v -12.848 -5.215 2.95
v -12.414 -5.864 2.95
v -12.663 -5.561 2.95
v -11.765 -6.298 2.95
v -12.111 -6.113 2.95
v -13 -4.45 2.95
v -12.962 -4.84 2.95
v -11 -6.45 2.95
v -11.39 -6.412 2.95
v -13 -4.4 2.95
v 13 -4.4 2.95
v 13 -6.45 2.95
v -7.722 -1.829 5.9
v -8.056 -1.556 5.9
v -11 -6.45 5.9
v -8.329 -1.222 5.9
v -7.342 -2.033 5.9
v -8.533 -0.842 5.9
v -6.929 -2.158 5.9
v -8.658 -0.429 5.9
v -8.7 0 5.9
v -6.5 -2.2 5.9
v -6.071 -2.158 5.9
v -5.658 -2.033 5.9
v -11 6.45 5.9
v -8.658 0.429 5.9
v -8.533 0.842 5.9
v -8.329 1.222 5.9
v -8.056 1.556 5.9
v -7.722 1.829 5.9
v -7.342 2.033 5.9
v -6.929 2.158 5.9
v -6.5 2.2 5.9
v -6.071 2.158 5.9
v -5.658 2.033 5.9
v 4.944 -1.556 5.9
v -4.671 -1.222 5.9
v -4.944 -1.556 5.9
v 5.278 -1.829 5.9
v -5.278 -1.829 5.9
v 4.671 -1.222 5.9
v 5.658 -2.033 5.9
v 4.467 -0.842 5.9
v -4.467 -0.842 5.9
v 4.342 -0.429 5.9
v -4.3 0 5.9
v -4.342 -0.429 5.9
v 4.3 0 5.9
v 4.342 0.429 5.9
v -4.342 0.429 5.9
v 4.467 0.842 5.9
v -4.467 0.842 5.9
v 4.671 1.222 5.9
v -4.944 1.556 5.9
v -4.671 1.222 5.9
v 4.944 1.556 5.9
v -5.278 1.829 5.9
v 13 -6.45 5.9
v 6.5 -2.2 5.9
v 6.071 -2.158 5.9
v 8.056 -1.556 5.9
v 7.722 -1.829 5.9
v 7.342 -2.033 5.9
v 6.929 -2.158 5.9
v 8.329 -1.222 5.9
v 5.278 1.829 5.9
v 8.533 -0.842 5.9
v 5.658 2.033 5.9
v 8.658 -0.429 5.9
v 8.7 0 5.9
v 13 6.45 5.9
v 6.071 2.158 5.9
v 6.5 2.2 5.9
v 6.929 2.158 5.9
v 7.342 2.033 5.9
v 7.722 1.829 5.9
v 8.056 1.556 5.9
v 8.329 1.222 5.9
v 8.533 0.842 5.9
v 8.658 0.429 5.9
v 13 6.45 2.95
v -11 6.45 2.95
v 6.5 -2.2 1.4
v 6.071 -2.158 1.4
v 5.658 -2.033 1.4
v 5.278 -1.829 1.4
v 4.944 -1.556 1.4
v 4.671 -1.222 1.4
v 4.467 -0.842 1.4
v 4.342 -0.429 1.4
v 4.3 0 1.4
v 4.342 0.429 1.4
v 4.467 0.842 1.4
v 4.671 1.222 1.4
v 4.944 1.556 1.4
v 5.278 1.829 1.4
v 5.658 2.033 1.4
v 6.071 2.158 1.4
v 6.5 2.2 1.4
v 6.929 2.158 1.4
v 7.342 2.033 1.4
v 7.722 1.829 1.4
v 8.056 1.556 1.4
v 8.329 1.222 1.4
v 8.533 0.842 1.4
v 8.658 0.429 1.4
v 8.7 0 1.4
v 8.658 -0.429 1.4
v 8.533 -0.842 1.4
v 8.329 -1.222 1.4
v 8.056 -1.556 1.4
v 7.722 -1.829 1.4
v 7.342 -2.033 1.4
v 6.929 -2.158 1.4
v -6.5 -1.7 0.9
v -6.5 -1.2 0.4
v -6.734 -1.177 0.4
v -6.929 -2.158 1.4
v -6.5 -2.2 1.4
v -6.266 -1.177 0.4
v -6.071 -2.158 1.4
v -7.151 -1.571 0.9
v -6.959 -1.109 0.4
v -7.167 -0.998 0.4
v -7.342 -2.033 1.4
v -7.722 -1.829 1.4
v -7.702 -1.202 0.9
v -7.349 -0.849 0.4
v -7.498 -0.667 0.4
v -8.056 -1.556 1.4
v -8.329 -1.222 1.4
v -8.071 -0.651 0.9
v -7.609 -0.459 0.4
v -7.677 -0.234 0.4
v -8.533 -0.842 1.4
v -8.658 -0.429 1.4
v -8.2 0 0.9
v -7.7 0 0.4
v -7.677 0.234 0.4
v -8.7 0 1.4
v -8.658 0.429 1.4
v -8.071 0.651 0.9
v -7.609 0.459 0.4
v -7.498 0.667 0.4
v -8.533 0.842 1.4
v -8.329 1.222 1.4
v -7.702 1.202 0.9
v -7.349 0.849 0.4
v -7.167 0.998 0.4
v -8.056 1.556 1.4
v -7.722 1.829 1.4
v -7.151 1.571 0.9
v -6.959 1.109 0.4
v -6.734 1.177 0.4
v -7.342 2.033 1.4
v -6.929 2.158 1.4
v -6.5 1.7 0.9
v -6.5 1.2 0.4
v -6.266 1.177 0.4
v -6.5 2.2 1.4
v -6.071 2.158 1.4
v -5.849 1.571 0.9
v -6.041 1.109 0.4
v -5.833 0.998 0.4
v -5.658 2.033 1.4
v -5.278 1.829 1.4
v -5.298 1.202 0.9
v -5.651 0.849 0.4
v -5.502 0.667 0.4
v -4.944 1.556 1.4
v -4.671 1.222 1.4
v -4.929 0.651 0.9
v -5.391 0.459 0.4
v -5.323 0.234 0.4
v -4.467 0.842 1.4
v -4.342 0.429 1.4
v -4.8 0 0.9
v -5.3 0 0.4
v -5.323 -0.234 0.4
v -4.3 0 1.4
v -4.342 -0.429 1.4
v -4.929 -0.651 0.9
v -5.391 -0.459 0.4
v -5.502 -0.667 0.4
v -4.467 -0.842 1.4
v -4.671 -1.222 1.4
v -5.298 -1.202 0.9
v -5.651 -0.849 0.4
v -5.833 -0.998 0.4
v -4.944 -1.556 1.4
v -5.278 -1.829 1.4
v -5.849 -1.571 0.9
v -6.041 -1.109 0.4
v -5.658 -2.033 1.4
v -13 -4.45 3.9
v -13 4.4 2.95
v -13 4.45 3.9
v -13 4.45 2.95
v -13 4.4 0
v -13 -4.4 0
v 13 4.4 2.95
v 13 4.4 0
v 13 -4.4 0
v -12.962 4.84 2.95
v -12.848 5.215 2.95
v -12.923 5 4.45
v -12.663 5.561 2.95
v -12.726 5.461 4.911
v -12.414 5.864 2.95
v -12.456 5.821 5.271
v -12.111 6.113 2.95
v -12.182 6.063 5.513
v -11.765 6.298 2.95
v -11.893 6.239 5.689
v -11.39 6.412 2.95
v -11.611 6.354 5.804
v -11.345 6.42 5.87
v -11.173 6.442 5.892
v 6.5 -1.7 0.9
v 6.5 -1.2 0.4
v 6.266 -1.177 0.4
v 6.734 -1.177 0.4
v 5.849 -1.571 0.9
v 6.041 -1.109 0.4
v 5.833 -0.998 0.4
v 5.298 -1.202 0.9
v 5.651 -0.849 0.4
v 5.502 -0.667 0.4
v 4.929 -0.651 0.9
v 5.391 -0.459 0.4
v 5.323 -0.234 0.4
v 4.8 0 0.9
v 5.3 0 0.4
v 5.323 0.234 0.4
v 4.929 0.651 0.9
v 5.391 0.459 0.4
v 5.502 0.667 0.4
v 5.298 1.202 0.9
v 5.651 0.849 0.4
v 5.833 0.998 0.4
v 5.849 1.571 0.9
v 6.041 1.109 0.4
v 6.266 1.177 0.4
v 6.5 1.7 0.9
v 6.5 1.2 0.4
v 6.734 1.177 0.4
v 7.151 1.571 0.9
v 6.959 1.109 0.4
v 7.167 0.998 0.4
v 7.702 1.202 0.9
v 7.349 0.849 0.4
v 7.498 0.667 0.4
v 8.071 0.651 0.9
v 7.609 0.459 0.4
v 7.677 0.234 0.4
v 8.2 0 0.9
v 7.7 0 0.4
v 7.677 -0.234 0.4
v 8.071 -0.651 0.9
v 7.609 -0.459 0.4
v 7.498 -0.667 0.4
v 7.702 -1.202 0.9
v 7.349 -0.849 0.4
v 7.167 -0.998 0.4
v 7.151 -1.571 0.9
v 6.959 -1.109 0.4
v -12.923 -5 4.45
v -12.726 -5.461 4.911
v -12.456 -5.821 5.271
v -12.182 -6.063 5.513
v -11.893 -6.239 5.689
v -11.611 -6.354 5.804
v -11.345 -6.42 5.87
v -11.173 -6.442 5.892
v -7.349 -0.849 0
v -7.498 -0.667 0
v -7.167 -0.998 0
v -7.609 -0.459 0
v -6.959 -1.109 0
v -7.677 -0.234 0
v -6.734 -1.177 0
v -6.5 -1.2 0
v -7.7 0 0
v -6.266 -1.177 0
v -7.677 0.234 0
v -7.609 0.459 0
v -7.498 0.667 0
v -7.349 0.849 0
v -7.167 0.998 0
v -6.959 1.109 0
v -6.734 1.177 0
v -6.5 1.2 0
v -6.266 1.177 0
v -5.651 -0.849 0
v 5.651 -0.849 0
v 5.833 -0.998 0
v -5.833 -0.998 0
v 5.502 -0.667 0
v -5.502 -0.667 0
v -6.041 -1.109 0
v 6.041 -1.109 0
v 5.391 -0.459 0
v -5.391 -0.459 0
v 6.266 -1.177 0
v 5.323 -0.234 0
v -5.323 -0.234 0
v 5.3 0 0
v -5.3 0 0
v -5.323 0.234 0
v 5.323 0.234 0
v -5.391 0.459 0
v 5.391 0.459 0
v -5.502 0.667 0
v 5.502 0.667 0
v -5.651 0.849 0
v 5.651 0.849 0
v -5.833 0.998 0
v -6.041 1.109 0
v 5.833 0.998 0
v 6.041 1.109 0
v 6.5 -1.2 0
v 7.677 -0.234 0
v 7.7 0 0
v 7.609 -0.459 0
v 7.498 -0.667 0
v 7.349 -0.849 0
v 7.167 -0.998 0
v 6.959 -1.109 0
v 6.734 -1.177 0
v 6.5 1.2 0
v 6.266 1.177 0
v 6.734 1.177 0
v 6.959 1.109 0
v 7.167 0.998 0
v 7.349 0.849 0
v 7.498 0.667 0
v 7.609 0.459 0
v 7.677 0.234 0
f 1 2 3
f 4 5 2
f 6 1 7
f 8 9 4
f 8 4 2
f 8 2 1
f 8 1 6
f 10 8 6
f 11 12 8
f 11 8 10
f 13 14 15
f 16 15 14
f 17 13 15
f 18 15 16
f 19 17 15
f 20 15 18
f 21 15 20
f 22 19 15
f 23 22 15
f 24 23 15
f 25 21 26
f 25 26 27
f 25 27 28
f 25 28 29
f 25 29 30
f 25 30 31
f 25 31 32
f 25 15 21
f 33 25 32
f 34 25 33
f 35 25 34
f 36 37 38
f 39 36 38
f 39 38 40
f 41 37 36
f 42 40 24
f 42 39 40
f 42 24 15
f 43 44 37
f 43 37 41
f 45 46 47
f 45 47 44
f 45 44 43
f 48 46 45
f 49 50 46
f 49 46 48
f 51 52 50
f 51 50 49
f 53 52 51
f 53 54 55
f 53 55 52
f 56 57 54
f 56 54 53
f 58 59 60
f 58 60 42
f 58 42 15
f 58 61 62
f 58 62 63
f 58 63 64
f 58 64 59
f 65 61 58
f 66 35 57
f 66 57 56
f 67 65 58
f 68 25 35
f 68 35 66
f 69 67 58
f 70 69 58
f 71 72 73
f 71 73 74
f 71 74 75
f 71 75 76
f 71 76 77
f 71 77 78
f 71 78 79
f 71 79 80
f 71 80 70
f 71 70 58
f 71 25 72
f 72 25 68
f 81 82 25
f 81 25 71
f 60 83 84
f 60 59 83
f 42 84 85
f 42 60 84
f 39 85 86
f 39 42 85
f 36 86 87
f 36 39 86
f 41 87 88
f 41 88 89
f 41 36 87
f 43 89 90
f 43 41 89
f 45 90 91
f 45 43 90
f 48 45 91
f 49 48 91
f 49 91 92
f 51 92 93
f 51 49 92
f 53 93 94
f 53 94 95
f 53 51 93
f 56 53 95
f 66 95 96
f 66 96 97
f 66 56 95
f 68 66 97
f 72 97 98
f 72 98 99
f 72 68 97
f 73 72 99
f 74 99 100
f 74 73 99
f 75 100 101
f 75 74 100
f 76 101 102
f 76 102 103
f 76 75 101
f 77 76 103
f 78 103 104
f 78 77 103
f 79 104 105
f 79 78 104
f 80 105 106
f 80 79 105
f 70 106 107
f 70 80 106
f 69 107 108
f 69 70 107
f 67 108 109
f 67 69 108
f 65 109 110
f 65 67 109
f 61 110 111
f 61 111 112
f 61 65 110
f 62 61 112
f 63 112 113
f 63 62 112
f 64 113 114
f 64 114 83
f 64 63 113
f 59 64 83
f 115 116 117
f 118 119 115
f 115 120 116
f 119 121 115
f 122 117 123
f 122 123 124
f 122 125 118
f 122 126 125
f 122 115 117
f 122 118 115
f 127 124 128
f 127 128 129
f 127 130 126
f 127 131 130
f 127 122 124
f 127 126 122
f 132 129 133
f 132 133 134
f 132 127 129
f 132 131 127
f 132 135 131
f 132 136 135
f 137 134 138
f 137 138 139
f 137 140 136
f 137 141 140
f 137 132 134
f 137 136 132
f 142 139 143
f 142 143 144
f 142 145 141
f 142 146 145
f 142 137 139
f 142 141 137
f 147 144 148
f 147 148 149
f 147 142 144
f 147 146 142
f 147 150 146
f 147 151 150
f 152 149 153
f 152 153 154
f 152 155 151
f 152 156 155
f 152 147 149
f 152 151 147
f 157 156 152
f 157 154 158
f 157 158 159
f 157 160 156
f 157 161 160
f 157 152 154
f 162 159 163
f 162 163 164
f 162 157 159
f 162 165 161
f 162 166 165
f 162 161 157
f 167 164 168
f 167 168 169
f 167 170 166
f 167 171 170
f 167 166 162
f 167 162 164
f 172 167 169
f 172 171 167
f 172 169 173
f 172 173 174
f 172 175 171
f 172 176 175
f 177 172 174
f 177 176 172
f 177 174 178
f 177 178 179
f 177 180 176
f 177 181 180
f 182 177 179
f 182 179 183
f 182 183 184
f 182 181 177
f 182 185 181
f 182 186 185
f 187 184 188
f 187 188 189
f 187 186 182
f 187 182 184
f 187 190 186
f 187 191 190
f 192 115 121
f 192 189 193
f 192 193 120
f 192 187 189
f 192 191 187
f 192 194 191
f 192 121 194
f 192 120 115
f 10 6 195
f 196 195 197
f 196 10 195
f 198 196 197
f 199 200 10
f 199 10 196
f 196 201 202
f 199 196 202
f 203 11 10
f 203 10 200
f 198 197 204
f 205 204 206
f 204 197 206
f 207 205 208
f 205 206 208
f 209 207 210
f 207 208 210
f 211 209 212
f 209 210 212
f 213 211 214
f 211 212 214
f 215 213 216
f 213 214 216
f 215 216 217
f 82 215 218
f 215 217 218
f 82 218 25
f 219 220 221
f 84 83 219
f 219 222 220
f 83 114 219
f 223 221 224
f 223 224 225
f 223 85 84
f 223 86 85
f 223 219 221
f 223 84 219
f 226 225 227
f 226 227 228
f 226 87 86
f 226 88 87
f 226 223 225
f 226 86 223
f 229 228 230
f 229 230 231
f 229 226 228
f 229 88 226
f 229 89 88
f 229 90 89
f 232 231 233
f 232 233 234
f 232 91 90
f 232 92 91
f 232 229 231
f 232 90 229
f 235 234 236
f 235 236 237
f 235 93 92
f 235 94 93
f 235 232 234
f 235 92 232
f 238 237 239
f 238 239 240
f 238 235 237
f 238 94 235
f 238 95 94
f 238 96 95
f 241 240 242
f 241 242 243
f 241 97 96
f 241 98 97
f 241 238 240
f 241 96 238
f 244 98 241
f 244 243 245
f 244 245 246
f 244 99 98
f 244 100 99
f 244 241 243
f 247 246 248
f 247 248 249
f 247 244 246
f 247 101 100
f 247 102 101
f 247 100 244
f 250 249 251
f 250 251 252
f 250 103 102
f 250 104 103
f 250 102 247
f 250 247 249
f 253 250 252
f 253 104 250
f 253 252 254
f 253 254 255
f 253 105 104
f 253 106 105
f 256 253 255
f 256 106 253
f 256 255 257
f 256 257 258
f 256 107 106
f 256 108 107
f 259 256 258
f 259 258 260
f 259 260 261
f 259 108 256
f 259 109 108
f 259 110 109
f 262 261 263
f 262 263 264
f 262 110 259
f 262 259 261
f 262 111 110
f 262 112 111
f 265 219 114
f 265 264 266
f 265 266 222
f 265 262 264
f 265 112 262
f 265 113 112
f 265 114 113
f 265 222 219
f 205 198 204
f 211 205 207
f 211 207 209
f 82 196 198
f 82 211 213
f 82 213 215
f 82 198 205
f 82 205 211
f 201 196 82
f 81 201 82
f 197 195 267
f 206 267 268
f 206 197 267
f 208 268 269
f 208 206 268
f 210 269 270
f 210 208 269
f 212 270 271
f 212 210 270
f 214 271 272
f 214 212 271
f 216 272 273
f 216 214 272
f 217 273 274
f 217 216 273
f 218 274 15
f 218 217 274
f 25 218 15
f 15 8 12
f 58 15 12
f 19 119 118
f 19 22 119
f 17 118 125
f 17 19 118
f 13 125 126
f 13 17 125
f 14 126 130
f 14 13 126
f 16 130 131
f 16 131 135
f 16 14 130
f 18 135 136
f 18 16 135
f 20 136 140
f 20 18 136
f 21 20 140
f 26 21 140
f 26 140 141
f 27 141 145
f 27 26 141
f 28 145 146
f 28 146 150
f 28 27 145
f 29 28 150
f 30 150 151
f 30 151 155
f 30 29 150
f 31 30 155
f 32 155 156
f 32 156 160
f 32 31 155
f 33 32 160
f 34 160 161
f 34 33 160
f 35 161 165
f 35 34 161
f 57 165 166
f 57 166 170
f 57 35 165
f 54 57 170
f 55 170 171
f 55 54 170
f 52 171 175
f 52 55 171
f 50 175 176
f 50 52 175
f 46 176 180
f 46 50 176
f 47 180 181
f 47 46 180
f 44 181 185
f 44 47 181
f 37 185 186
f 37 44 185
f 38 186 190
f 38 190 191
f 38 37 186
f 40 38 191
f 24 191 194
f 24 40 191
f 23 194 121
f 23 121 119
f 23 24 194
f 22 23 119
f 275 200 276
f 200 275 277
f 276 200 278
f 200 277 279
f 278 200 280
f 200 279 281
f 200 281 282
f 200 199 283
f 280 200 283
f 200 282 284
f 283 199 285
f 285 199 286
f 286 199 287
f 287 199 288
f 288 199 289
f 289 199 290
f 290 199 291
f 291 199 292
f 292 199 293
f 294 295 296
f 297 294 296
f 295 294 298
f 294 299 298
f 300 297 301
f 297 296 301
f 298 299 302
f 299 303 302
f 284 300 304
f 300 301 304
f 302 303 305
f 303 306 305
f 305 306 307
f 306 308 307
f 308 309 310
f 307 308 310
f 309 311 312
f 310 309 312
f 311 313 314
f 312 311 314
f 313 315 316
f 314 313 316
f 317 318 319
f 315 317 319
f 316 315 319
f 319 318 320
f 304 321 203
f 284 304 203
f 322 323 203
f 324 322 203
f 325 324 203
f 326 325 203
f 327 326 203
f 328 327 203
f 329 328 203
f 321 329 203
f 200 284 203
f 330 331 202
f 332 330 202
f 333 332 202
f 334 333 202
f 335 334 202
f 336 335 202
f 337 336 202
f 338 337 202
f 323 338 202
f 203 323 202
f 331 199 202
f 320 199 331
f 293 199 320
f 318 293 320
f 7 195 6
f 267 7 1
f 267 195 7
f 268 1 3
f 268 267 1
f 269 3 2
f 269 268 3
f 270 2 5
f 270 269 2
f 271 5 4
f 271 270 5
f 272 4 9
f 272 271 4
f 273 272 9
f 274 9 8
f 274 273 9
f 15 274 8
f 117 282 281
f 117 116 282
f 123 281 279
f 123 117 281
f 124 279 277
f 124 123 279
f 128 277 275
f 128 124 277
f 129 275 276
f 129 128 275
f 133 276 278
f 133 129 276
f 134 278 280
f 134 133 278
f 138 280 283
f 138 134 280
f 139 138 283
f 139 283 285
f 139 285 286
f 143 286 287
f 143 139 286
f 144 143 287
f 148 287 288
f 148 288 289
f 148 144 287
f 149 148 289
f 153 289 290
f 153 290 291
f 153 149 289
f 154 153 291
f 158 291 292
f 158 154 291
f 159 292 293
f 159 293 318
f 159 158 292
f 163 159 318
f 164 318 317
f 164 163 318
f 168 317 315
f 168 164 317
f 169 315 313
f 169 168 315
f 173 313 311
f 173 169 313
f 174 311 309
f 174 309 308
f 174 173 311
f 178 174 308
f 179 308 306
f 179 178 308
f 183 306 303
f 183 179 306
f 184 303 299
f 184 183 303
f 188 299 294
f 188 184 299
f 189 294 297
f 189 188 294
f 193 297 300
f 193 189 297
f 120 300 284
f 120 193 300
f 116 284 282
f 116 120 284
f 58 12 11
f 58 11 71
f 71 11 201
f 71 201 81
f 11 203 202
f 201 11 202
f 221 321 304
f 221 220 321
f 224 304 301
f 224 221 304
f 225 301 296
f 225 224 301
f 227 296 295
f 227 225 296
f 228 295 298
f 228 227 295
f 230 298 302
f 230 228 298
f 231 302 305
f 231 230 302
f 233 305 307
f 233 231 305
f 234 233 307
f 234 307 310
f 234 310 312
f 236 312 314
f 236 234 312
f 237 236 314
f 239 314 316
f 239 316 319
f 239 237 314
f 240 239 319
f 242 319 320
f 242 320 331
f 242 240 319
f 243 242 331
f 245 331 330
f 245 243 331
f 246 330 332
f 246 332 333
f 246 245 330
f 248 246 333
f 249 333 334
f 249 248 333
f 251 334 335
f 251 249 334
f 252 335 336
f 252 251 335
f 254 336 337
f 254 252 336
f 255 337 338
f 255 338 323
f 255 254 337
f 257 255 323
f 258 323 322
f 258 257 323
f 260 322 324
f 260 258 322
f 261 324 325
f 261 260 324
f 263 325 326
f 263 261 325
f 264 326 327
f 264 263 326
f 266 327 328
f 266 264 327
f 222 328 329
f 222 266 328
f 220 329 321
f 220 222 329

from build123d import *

# Parameters (mm, degrees)
SKETCH1_W                                    = 26
SKETCH1_H                                    = 12.9
BOSS_EXTRUDE1_DEPTH                          = 5.9
SKETCH2_W                                    = 2.95
SKETCH2_H                                    = 2.05
CUT_EXTRUDE1_DEPTH                           = 27
CSK_SLOT_FOR_M2_COUNTERSUNK_FLAT_HEA_2_COUNT = 2
CSK_SLOT_FOR_M2_COUNTERSUNK_FLAT_HEA_2_PITCH = 13
FILLET1_R                                    = 2


with BuildPart() as part:
    # Sketch1 → Boss-Extrude1 (new body)
    with BuildSketch(Plane.XY):
        Rectangle(SKETCH1_W, SKETCH1_H)
    extrude(amount=BOSS_EXTRUDE1_DEPTH)

    # Sketch2 → Cut-Extrude1 (cut, through all)
    with BuildSketch(Plane(origin=(13, 0, 0), x_dir=(0, 0, -1), z_dir=(1, 0, 0))):
        with Locations((-1.475, 5.425)):
            Rectangle(SKETCH2_W, SKETCH2_H)
        with Locations((-1.475, -5.425)):
            Rectangle(SKETCH2_W, SKETCH2_H)
    extrude(amount=-CUT_EXTRUDE1_DEPTH, mode=Mode.SUBTRACT)

    # Sketch3 → CSK SLOT for M2 Countersunk Flat Head Screw1 (revolve, cut)
    with BuildSketch(Plane(origin=(-6.5, 0, 5.9), x_dir=(0, -1, 0), z_dir=(1, 0, 0))):
        Polygon((0, 0), (0, 6.621032743), (1.2, 5.9), (1.2, 5.5), (2.2, 4.5), (2.2, 0), align=None)
    csk_slot_for_m2_countersunk_flat_head_sc = revolve(axis=Axis((-6.5, 0, 12.25), (0, 0, -1)), mode=Mode.SUBTRACT)

    # CSK SLOT for M2 Countersunk Flat Hea 2: CSK SLOT for M2 Countersunk Flat Head Screw1 ×2
    with Locations(*[(i * CSK_SLOT_FOR_M2_COUNTERSUNK_FLAT_HEA_2_PITCH, 0, 0) for i in range(1, CSK_SLOT_FOR_M2_COUNTERSUNK_FLAT_HEA_2_COUNT)]):
        add(csk_slot_for_m2_countersunk_flat_head_sc, mode=Mode.SUBTRACT)

    # Fillet1
    fillet1_edges = [part.edges().sort_by_distance(p)[0] for p in [
        (-13, 0, 5.9),
        (-13, 6.45, 4.425),
        (-13, -6.45, 4.425),
    ]]
    fillet(fillet1_edges, radius=FILLET1_R)


solid = part.part
